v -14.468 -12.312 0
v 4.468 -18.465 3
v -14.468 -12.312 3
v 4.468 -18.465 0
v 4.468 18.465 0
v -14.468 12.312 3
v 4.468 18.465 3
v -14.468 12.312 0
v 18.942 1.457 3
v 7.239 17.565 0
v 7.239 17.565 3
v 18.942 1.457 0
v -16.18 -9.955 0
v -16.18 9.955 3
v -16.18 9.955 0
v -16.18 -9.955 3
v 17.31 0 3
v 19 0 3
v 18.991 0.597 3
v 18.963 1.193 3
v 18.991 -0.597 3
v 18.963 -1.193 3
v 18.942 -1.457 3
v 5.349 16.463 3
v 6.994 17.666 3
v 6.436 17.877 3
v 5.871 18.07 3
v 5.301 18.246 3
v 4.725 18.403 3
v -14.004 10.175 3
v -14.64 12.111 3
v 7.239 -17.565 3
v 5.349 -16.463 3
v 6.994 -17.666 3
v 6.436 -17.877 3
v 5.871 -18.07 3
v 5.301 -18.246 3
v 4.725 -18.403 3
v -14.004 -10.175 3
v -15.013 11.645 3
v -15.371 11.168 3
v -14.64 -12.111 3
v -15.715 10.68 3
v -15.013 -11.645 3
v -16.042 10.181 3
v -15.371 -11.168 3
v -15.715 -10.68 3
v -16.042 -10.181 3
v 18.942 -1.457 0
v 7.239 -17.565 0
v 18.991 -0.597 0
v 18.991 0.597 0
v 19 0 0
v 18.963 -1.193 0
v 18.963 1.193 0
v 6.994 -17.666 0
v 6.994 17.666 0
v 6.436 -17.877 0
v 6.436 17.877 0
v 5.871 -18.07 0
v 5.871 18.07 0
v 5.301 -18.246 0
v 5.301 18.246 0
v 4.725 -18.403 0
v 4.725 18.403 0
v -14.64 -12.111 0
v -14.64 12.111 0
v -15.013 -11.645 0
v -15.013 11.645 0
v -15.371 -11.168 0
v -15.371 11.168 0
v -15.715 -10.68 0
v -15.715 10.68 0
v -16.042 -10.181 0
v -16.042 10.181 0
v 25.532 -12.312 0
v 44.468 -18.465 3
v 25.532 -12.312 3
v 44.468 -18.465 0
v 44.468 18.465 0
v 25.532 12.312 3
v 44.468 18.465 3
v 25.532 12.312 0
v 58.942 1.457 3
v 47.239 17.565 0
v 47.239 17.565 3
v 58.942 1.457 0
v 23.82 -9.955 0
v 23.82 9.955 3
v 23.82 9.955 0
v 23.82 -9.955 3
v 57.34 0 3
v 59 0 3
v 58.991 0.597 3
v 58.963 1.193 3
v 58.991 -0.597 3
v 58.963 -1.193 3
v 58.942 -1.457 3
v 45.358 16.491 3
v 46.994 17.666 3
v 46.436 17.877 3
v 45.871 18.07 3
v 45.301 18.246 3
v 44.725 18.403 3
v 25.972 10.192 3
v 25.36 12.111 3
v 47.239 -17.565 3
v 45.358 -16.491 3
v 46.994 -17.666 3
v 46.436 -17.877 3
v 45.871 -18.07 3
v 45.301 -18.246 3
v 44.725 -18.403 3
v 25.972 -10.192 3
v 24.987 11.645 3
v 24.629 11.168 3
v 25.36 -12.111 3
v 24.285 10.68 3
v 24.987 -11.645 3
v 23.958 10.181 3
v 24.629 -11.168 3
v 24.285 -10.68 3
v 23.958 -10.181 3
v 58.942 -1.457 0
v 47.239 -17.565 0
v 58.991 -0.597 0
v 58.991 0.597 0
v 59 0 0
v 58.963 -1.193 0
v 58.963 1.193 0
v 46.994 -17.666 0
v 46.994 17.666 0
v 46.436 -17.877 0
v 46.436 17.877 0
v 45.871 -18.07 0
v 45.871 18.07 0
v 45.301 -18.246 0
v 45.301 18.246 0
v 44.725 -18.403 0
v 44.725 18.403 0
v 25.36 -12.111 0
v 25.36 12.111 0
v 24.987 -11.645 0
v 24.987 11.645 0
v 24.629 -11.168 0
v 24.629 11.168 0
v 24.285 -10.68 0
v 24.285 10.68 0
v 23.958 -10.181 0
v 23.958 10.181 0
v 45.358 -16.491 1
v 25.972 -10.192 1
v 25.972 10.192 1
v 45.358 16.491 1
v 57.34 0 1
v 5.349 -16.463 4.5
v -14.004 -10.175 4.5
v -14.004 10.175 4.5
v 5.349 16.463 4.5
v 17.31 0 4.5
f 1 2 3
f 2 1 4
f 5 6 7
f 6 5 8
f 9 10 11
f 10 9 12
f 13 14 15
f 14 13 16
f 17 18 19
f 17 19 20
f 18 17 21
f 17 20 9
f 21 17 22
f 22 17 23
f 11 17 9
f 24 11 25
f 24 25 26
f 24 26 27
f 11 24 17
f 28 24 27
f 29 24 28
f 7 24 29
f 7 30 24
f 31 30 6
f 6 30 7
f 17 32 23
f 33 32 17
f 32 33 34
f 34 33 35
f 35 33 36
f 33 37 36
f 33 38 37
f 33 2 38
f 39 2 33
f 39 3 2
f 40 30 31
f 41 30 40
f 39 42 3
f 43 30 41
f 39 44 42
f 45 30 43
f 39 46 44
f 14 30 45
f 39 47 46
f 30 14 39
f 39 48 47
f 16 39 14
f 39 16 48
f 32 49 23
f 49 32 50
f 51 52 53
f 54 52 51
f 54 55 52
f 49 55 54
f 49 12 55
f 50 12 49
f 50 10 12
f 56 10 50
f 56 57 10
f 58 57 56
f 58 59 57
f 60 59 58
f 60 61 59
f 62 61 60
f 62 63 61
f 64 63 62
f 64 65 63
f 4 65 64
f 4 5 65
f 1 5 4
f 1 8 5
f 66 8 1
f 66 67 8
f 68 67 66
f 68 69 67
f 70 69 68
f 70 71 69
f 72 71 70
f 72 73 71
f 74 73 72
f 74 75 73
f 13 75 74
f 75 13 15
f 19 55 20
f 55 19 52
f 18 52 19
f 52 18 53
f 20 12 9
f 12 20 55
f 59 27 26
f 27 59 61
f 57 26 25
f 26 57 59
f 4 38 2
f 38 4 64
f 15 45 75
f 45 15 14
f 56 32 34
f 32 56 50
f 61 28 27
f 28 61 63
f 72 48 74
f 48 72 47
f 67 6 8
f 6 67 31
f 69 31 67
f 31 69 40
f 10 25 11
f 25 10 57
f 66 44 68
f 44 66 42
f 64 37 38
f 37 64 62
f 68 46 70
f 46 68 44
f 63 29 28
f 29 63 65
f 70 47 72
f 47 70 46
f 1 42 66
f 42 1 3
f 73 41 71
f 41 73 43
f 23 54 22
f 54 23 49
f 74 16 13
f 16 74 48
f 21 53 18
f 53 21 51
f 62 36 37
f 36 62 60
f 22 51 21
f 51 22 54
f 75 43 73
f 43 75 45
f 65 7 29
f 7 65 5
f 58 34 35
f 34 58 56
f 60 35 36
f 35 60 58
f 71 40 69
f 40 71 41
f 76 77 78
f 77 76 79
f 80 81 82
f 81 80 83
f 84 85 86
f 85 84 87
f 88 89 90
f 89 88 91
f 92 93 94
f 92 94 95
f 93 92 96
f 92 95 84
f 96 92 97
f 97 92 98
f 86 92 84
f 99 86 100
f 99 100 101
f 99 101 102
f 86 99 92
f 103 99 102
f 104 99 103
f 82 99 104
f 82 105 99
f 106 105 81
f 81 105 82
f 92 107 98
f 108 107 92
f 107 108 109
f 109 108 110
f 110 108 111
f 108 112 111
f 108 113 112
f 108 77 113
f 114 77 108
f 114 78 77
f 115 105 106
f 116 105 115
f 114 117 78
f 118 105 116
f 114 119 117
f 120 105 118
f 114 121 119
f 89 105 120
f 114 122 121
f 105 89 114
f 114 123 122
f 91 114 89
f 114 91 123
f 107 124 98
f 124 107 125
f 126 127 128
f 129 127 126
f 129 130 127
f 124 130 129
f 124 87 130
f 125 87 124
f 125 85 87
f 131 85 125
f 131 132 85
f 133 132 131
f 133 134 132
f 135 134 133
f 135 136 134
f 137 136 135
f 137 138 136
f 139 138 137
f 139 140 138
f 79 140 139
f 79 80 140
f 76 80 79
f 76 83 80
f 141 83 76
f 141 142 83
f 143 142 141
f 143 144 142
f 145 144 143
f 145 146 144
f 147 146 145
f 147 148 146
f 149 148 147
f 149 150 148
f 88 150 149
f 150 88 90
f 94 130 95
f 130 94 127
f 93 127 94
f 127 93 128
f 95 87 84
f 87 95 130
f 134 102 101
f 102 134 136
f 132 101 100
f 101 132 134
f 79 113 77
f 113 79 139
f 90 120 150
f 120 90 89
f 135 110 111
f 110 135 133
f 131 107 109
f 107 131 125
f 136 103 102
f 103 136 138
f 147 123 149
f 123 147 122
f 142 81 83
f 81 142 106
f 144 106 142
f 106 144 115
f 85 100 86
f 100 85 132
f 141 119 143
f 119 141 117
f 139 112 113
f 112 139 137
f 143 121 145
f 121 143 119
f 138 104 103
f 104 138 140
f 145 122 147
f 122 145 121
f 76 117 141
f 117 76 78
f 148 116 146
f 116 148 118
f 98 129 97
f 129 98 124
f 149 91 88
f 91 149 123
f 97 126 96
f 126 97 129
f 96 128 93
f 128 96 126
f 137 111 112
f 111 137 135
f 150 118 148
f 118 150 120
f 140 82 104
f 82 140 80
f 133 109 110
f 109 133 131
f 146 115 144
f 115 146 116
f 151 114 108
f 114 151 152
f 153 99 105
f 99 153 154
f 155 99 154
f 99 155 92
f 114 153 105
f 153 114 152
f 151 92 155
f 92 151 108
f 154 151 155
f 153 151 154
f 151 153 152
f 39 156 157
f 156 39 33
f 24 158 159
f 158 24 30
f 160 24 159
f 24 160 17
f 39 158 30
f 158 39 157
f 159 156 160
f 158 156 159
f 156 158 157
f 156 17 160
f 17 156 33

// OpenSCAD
intersection(){
    cylinder (h = 3, r = 20, $fn=5);
    cylinder (h = 3, r = 19, $fn=200);
}
translate([0, 0, 3])
cylinder (h = 1.5, r = 17.31, $fn=5);

translate([40, 0 , 0])
difference(){
    intersection(){
        cylinder (h = 3, r = 20, $fn=5);
        cylinder (h = 3, r = 19, $fn=200);
    }
    translate([0, 0, 1])
    cylinder (h = 2, r = 17.34, $fn=5);
}
